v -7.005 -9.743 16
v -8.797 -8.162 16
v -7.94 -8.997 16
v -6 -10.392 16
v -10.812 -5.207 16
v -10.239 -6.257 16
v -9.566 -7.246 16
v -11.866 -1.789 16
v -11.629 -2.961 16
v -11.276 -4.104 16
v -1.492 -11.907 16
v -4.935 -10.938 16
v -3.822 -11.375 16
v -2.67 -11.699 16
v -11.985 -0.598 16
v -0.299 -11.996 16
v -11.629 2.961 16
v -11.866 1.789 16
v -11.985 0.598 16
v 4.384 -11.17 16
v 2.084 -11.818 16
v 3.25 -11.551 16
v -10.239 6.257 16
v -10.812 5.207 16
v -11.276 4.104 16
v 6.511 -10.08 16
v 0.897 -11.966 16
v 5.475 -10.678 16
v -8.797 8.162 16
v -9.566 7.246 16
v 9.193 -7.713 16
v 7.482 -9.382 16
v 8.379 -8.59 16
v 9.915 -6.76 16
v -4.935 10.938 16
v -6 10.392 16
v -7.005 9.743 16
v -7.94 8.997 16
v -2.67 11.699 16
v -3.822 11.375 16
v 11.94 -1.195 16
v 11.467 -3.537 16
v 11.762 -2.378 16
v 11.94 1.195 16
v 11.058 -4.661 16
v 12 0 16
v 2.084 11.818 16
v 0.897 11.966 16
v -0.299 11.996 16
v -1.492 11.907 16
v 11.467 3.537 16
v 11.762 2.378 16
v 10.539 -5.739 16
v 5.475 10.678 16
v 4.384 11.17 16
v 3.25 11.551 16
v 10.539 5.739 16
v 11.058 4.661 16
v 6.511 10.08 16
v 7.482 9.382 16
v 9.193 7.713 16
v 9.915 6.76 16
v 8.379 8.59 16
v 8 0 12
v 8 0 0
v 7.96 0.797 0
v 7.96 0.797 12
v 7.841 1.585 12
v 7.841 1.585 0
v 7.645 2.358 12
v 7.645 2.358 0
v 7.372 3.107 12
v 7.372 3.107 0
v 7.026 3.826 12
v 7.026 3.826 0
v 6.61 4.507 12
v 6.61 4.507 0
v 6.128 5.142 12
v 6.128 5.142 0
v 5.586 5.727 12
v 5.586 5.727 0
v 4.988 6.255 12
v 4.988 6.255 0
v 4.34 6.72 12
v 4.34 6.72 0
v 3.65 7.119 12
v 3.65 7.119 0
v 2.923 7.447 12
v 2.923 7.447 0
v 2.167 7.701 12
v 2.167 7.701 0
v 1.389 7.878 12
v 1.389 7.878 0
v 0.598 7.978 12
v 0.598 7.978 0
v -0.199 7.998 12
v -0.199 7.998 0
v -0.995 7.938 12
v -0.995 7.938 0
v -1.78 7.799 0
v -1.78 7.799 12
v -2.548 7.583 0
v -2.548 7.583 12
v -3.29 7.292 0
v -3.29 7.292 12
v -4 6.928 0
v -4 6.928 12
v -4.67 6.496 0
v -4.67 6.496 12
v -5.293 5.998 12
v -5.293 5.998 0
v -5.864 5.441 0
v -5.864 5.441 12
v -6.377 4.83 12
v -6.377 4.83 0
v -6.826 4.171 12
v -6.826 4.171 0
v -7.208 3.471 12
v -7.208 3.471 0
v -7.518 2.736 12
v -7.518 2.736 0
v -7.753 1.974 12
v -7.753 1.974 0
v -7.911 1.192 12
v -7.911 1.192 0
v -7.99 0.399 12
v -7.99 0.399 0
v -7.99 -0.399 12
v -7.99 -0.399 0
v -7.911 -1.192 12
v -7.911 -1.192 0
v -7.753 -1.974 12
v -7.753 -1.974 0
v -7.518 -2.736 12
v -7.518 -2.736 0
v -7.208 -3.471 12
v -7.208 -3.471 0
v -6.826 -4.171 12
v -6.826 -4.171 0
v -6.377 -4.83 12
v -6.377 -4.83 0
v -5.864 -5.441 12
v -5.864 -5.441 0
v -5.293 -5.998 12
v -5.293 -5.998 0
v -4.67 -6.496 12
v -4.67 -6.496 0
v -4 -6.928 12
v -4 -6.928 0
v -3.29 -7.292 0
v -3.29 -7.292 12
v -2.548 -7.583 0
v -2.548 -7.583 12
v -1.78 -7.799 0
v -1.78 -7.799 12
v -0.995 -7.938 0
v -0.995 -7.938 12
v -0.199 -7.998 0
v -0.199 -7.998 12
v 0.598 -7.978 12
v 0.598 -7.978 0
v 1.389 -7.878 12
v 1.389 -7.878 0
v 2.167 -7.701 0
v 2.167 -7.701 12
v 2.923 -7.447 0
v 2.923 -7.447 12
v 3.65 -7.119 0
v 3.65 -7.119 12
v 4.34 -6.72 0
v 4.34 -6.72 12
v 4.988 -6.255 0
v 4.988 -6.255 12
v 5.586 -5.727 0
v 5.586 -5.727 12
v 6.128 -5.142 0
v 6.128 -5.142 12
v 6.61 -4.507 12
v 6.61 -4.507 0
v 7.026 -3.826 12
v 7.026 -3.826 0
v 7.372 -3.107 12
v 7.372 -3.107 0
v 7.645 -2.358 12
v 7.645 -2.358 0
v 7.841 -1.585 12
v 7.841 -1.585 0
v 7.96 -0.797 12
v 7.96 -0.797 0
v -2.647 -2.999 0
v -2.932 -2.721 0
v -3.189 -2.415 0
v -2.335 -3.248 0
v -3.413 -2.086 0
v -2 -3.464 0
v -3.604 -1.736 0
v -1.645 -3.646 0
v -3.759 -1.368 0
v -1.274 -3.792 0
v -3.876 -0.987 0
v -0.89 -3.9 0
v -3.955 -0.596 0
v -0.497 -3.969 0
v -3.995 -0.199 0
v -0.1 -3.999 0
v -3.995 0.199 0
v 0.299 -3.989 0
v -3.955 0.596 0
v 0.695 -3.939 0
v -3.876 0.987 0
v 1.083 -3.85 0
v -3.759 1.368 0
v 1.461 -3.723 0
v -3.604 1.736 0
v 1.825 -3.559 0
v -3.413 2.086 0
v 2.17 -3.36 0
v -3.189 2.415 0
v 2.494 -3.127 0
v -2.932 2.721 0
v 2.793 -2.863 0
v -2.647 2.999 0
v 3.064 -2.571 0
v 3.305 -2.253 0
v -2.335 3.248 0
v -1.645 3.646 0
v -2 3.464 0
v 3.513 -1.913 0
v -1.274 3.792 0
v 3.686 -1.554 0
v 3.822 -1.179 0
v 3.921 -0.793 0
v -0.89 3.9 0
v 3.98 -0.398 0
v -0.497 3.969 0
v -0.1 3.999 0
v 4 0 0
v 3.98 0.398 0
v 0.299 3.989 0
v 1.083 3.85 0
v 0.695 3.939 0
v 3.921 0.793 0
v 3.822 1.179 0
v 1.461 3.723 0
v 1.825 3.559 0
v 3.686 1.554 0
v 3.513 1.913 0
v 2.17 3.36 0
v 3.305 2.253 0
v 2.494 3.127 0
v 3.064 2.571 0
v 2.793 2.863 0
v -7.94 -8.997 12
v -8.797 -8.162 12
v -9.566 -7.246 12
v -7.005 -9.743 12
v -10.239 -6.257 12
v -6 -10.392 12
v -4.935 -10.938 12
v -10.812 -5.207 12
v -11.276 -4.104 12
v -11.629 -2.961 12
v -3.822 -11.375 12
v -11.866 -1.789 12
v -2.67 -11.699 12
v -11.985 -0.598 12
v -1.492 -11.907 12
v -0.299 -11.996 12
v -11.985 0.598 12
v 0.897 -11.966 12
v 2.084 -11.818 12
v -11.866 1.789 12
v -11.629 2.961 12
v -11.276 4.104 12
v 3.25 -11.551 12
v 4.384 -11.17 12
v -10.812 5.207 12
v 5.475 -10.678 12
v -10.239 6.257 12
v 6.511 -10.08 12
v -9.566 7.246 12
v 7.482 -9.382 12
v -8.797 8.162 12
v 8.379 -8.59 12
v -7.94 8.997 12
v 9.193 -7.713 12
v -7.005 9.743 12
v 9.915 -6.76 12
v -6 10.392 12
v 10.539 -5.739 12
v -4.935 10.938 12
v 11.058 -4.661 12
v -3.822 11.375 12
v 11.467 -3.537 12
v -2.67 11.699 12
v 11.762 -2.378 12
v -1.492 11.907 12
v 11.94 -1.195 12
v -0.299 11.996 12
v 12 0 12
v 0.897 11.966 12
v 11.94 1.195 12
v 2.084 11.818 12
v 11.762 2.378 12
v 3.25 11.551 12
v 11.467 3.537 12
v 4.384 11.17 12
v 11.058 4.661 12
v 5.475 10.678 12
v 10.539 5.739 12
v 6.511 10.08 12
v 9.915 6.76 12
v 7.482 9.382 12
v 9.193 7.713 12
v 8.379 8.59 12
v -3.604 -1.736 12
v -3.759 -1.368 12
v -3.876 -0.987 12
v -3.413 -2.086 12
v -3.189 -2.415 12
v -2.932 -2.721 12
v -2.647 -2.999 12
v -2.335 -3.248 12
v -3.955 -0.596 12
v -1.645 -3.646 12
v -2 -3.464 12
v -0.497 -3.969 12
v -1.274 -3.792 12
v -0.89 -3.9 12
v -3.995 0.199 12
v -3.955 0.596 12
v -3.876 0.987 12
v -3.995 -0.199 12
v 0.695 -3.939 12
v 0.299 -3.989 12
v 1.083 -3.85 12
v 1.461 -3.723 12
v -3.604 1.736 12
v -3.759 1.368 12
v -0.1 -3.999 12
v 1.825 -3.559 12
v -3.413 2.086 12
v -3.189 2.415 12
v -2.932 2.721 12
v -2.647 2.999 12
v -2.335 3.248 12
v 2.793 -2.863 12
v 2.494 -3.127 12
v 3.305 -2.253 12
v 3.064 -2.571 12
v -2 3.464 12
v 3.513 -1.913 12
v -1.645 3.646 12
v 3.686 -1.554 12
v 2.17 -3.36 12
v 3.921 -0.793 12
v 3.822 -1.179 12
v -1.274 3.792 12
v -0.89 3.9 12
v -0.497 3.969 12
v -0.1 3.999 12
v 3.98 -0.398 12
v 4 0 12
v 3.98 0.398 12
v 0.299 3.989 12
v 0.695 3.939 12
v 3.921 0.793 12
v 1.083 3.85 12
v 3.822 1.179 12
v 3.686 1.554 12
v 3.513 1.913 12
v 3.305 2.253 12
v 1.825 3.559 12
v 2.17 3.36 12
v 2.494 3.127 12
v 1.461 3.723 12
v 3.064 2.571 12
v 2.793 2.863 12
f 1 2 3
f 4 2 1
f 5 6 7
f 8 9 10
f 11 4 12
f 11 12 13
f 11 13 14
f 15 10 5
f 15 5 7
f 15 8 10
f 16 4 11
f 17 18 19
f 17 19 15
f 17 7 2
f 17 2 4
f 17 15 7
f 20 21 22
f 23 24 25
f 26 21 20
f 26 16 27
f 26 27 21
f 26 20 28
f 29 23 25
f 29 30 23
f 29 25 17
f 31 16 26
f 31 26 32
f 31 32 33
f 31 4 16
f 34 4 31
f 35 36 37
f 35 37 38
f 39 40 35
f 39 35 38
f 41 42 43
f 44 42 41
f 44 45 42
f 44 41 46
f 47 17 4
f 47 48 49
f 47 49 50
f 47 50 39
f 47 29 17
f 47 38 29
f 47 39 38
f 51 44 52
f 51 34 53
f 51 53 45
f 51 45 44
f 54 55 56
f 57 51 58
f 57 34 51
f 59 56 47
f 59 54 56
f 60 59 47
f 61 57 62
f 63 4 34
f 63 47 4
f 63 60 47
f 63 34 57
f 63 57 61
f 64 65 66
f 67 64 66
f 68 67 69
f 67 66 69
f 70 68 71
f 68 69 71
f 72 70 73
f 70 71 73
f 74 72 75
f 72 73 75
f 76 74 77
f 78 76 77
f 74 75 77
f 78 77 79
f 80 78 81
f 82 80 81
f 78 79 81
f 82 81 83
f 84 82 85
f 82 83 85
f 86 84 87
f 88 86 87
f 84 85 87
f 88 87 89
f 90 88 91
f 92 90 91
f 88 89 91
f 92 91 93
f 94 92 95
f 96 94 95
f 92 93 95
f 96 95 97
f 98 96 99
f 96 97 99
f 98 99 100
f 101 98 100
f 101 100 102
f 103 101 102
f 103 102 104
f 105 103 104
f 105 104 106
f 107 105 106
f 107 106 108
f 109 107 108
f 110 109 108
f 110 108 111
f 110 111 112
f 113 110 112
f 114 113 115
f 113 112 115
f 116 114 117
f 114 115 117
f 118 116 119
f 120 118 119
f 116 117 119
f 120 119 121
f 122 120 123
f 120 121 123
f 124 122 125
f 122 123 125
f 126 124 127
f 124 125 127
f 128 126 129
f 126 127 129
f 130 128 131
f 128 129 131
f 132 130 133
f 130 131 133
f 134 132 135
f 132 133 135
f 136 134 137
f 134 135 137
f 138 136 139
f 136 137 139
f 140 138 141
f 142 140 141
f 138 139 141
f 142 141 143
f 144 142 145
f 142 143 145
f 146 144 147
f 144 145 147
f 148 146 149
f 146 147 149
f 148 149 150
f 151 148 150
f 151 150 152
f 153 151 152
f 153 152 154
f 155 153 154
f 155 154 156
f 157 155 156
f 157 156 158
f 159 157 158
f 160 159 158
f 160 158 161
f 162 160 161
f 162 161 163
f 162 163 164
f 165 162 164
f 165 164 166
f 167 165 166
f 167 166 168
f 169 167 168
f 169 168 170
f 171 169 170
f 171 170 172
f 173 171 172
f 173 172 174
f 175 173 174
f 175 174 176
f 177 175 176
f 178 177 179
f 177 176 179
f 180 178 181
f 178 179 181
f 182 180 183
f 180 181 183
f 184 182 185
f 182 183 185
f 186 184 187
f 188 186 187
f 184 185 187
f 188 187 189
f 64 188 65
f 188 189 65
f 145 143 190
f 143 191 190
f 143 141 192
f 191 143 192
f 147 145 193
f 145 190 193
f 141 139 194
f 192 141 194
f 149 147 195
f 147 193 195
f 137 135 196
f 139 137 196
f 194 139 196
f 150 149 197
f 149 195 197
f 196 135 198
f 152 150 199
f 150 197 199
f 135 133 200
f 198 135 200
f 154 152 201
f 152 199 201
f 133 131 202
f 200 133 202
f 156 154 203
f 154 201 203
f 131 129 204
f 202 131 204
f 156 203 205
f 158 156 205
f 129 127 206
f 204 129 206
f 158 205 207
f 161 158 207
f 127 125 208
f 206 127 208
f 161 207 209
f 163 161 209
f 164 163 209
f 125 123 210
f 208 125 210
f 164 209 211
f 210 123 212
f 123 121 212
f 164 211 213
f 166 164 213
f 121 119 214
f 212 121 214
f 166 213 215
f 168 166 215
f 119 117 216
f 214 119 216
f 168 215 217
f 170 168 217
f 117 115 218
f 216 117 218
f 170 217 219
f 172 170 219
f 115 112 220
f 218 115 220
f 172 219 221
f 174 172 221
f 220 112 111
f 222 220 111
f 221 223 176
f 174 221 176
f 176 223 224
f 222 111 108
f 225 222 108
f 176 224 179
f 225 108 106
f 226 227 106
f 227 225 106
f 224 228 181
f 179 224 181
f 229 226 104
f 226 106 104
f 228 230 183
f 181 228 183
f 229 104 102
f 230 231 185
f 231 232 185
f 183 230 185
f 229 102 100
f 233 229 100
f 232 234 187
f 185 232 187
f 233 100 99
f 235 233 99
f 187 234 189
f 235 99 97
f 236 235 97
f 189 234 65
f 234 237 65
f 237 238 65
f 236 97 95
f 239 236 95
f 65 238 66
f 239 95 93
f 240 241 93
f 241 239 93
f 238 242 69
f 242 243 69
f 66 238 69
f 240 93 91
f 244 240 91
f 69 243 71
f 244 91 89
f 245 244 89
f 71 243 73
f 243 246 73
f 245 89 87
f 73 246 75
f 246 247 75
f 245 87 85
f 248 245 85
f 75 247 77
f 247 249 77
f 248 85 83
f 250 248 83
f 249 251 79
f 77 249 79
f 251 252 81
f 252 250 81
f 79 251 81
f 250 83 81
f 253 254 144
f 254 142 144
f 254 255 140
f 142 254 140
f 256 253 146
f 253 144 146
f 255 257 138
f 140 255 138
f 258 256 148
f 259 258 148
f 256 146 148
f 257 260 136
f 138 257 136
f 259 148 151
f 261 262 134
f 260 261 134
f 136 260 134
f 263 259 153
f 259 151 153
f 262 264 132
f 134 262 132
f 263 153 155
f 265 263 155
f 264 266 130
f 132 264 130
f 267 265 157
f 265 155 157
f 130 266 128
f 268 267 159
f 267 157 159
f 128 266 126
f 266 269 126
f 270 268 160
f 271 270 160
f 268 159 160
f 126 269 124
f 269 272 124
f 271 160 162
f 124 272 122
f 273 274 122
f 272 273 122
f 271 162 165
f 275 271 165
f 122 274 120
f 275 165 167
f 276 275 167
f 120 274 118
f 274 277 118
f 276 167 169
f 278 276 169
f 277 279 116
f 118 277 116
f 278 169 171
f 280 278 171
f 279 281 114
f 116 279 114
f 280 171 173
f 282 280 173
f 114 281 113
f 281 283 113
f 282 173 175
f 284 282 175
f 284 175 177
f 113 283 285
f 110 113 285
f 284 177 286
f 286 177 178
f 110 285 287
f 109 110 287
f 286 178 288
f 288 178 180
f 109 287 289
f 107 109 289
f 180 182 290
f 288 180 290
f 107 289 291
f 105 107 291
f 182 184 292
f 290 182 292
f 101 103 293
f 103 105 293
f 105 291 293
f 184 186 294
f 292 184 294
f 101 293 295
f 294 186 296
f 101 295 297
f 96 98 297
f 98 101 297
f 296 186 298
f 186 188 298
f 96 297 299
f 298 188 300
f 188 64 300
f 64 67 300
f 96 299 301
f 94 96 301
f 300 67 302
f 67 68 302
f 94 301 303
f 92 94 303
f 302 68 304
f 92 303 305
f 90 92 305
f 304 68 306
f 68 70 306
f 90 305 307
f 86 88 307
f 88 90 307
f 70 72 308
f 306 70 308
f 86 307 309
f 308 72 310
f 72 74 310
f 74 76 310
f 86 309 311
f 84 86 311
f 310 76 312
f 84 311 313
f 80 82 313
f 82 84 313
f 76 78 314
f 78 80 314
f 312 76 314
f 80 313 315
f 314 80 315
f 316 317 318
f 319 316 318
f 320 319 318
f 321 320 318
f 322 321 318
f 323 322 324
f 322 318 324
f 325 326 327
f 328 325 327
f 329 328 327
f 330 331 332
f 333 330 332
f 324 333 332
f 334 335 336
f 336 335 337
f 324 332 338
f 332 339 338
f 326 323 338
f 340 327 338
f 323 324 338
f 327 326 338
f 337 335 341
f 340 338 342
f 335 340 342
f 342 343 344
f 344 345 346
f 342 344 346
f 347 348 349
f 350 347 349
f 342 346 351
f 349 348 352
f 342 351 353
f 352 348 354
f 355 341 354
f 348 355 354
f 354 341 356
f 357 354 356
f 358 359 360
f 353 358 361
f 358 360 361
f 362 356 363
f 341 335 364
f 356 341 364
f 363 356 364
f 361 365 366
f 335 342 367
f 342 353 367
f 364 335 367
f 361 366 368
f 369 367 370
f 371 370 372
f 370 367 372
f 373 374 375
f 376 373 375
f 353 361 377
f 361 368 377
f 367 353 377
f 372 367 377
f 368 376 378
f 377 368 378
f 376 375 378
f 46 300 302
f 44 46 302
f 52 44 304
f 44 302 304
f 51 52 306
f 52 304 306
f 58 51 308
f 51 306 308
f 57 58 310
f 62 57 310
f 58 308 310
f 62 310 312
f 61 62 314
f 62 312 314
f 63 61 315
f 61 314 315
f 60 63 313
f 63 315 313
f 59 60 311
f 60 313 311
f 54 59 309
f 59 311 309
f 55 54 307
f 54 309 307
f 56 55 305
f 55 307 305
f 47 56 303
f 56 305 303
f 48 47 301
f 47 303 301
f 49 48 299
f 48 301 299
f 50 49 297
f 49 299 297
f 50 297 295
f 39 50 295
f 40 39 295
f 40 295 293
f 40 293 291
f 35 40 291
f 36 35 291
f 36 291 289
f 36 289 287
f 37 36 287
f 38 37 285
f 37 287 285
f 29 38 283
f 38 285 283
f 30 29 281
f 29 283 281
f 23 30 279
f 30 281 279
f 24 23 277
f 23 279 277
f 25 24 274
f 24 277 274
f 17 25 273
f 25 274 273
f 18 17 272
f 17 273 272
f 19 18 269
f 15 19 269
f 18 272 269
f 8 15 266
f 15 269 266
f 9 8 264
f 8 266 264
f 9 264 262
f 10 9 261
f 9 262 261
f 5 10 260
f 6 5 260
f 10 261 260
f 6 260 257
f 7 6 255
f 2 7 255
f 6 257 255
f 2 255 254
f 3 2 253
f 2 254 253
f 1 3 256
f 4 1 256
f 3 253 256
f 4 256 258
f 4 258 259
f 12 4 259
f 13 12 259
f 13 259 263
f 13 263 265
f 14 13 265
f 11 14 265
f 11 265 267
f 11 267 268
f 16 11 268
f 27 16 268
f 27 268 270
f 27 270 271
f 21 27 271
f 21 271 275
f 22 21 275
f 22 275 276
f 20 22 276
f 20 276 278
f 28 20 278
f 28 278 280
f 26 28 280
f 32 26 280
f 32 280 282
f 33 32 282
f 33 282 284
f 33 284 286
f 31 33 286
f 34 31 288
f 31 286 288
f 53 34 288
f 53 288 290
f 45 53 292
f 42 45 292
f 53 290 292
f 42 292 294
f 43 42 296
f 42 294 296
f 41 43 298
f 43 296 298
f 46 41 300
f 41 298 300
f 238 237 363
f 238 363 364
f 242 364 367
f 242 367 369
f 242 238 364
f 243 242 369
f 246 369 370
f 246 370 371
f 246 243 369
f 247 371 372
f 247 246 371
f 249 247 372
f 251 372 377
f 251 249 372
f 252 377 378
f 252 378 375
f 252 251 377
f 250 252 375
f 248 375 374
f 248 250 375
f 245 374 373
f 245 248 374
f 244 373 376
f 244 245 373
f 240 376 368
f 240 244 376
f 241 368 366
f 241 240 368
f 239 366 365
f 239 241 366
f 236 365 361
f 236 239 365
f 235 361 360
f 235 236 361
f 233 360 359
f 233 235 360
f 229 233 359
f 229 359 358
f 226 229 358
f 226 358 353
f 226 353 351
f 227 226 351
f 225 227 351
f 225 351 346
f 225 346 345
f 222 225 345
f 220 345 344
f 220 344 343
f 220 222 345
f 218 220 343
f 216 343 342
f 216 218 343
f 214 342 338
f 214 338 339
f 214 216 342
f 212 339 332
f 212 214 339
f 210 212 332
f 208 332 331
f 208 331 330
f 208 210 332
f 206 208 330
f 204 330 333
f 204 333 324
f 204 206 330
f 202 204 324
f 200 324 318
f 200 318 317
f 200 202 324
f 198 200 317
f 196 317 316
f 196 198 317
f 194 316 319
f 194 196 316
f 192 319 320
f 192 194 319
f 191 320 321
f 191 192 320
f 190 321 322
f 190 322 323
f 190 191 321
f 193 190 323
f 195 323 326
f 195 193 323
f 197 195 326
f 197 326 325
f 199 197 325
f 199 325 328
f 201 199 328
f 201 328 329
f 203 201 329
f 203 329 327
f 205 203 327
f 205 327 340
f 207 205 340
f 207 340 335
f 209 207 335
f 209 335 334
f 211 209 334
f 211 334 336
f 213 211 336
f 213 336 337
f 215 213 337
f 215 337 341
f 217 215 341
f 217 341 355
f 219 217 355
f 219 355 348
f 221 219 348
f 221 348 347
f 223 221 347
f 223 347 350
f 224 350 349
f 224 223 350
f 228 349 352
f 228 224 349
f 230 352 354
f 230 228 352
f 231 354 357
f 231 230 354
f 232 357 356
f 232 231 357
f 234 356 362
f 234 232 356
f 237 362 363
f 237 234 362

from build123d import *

# Parameters (mm, degrees)
F0_R     = 8
F0_R_2   = 4
F1_DEPTH = 12
F3_R     = 12
F4_DEPTH = 4


with BuildPart() as f1:
    # F0 (on Top) → F1 (new body)
    with BuildSketch(Plane.XY):
        Circle(F0_R)
        Circle(F0_R_2, mode=Mode.SUBTRACT)
    extrude(amount=F1_DEPTH)

    # F3 (on offset) → F4 (join)
    with BuildSketch(Plane.XY.offset(12)):
        Circle(F3_R)
    extrude(amount=F4_DEPTH)


solid = f1.part
